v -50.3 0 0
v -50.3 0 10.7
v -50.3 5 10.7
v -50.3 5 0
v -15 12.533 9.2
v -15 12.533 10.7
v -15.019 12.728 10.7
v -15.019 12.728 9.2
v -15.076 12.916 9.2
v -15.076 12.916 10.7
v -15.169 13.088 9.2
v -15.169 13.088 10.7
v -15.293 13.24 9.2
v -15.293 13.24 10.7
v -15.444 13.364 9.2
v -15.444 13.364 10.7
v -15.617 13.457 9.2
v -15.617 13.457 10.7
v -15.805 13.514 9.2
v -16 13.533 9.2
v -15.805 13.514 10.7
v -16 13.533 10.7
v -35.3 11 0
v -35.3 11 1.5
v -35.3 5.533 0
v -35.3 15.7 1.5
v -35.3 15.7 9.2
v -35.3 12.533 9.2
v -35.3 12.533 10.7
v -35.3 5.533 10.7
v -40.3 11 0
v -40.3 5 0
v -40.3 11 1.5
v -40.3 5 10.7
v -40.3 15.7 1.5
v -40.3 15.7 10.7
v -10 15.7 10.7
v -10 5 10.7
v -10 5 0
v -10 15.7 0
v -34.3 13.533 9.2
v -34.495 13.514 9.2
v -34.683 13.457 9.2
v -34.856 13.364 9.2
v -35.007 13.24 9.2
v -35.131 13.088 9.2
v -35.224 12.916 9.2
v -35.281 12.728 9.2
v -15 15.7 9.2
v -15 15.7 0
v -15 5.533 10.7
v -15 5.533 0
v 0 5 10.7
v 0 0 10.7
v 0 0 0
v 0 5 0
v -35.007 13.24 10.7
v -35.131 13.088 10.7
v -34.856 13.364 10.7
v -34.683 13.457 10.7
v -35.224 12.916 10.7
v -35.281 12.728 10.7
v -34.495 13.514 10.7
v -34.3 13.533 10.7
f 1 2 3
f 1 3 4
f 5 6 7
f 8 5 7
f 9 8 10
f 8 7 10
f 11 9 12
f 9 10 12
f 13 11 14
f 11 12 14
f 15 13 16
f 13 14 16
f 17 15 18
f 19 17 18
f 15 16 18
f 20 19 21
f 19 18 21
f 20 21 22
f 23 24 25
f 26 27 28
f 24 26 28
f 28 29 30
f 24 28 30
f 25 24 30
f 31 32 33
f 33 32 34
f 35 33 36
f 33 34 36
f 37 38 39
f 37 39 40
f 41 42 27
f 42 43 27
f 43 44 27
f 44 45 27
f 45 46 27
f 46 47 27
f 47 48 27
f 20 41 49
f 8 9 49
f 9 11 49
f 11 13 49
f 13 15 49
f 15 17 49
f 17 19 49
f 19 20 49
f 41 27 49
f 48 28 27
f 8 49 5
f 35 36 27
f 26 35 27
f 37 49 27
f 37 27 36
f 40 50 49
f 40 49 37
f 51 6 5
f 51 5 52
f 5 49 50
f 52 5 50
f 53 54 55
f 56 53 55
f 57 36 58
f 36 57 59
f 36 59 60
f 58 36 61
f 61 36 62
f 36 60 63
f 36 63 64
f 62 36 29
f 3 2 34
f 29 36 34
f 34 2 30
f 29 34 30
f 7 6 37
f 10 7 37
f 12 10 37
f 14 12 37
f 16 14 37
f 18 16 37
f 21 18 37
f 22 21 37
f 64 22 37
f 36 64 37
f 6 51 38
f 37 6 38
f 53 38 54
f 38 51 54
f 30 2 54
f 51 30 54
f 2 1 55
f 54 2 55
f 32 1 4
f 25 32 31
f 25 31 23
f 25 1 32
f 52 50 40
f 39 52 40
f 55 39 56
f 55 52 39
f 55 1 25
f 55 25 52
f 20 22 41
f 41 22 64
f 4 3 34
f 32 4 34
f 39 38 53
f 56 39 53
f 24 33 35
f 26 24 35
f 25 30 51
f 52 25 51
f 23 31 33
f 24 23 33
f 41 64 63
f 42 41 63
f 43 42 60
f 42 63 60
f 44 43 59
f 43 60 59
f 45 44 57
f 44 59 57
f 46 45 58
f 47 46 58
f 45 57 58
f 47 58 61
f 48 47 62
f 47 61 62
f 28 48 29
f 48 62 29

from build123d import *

# Parameters (mm, degrees)
CROQUIS1_W              = 50.3
CROQUIS1_H              = 10.7
SALIENTE_EXTRUIR1_DEPTH = 15.7
CORTAR_EXTRUIR1_REACH   = 55.769
CROQUIS2_W              = 10
CROQUIS2_H              = 10.7
CORTAR_EXTRUIR2_REACH   = 55.769
CROQUIS3_W              = 20.3
CROQUIS3_H              = 9.2
CORTAR_EXTRUIR3_REACH   = 46.554
CROQUIS4_W              = 1.5
CROQUIS4_H              = 4.7


with BuildPart() as part:
    # Croquis1 → Saliente-Extruir1 (new body)
    with BuildSketch(Plane(origin=(0, 0, 0), x_dir=(1, 0, 0), z_dir=(0, 1, 0))):
        with Locations((-25.15, -5.35)):
            Rectangle(CROQUIS1_W, CROQUIS1_H)
    extrude(amount=SALIENTE_EXTRUIR1_DEPTH)

    # Croquis2 → Cortar-Extruir1 (cut, up to next)
    with BuildSketch(Plane.XY.offset(10.7), mode=Mode.PRIVATE) as cortar_extruir1_sk1:
        with Locations((-45.3, 10.35)):
            Rectangle(CROQUIS2_W, CROQUIS2_H)
    cortar_extruir1_tool1 = extrude(cortar_extruir1_sk1.sketch, amount=-CORTAR_EXTRUIR1_REACH, mode=Mode.PRIVATE) & part.part
    # Croquis2 → Cortar-Extruir1 (cut, up to next)
    with BuildSketch(Plane.XY.offset(10.7), mode=Mode.PRIVATE) as cortar_extruir1_sk2:
        with BuildLine():
            Line((-35.3, 5.532906309), (-15, 5.532906309))
            Line((-15, 5.532906309), (-15, 12.532906309))
            ThreePointArc((-15, 12.532906309), (-15.292893219, 13.240013091), (-16, 13.532906309))
            Line((-16, 13.532906309), (-34.3, 13.532906309))
            ThreePointArc((-34.3, 13.532906309), (-35.007106781, 13.240013091), (-35.3, 12.532906309))
            Line((-35.3, 12.532906309), (-35.3, 5.532906309))
        make_face()
    cortar_extruir1_tool2 = extrude(cortar_extruir1_sk2.sketch, amount=-CORTAR_EXTRUIR1_REACH, mode=Mode.PRIVATE) & part.part
    # Croquis2 → Cortar-Extruir1 (cut, up to next)
    with BuildSketch(Plane.XY.offset(10.7), mode=Mode.PRIVATE) as cortar_extruir1_sk3:
        with Locations((-5, 10.35)):
            Rectangle(CROQUIS2_W, CROQUIS2_H)
    cortar_extruir1_tool3 = extrude(cortar_extruir1_sk3.sketch, amount=-CORTAR_EXTRUIR1_REACH, mode=Mode.PRIVATE) & part.part
    add(cortar_extruir1_tool1.solids().sort_by_distance((-45.3, 10.35, 10.7))[0], mode=Mode.SUBTRACT)
    add(cortar_extruir1_tool2.solids().sort_by_distance((-25.15, 9.522899, 10.7))[0], mode=Mode.SUBTRACT)
    add(cortar_extruir1_tool3.solids().sort_by_distance((-5, 10.35, 10.7))[0], mode=Mode.SUBTRACT)

    # Croquis3 → Cortar-Extruir2 (cut, up to next)
    with BuildSketch(Plane(origin=(0, 15.7, 0), x_dir=(1, 0, 0), z_dir=(0, 1, 0)), mode=Mode.PRIVATE) as cortar_extruir2_sk1:
        with Locations((-25.15, -4.6)):
            Rectangle(CROQUIS3_W, CROQUIS3_H)
    cortar_extruir2_tool1 = extrude(cortar_extruir2_sk1.sketch, amount=-CORTAR_EXTRUIR2_REACH, mode=Mode.PRIVATE) & part.part
    add(cortar_extruir2_tool1.solids().sort_by_distance((-25.15, 15.7, 4.6))[0], mode=Mode.SUBTRACT)

    # Croquis4 → Cortar-Extruir3 (cut, up to next)
    with BuildSketch(Plane.ZY.offset(40.3), mode=Mode.PRIVATE) as cortar_extruir3_sk1:
        with Locations((0.75, 13.35)):
            Rectangle(CROQUIS4_W, CROQUIS4_H)
    cortar_extruir3_tool1 = extrude(cortar_extruir3_sk1.sketch, amount=-CORTAR_EXTRUIR3_REACH, mode=Mode.PRIVATE) & part.part
    add(cortar_extruir3_tool1.solids().sort_by_distance((-40.3, 13.35, 0.75))[0], mode=Mode.SUBTRACT)


solid = part.part
